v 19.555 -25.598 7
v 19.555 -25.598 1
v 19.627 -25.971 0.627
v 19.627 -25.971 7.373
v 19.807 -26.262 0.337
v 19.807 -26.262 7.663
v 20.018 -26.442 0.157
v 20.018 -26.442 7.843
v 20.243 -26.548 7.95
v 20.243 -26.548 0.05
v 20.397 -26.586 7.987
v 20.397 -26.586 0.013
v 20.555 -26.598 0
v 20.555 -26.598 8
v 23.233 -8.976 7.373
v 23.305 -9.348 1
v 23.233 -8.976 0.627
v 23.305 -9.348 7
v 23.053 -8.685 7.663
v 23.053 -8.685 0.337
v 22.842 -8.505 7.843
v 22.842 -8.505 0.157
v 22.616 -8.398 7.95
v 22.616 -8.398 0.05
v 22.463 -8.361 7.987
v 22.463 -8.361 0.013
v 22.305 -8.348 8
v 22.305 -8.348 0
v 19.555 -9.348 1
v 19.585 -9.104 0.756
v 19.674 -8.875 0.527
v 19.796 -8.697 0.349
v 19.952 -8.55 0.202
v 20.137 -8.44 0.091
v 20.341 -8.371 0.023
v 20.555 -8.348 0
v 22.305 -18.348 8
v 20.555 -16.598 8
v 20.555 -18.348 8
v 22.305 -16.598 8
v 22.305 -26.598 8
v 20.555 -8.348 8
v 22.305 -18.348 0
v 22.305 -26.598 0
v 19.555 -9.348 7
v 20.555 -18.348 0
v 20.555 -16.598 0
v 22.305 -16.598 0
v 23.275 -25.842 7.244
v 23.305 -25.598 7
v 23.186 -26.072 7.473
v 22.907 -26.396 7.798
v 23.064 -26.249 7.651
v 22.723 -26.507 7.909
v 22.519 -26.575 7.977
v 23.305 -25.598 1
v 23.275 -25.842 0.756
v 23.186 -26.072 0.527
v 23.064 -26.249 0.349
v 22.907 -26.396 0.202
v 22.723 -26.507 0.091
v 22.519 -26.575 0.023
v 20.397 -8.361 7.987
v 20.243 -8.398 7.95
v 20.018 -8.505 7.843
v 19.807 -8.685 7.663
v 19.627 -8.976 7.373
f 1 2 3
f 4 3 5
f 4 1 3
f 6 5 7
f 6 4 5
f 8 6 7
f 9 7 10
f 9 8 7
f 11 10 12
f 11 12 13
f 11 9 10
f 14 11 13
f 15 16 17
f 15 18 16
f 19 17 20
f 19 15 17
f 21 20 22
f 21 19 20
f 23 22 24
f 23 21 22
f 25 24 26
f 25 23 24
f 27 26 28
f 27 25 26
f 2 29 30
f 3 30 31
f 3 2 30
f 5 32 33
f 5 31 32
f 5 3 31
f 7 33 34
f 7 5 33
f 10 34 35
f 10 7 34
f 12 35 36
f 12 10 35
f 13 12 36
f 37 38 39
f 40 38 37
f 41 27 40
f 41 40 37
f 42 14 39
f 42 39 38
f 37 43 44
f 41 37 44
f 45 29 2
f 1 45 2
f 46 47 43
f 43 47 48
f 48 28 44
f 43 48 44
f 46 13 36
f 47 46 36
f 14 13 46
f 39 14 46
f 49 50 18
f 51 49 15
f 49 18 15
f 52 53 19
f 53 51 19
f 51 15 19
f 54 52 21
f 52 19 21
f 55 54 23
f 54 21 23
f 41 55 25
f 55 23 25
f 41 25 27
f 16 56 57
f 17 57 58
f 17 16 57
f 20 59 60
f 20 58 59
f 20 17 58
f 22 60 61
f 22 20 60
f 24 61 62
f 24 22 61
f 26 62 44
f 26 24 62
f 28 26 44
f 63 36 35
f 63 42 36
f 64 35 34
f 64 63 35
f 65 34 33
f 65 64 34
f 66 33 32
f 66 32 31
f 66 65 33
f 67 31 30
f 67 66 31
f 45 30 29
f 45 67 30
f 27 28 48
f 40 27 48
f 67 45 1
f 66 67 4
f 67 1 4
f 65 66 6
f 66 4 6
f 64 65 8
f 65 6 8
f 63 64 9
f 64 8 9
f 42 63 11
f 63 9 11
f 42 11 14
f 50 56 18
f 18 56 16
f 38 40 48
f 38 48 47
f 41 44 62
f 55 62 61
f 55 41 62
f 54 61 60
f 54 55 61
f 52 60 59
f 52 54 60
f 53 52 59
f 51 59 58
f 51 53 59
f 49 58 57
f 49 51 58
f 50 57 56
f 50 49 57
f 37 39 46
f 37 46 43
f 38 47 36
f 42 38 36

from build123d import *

# Parameters (mm, degrees)
F1_DEPTH = 8
F2_R     = 0.99999


# Not quite as in the source:
# - a fillet or chamfer is up to 0.001 mm smaller than in the source, because OpenCascade refuses the exact size


with BuildPart() as f1:
    # F0 (on Top) → F1 (new body)
    with BuildSketch(Plane.XY):
        Polygon((20.5548869669, -26.5982374549), (20.5548869669, -18.3482374549), (22.3048869669, -18.3482374549), (22.3048869669, -26.5982374549), (23.3048869669, -26.5982374549), (23.3048869669, -18.3482374549), (23.3048869669, -8.3482374549), (22.3048869669, -8.3482374549), (22.3048869669, -16.5982374549), (20.5548869669, -16.5982374549), (20.5548869669, -8.3482374549), (19.5548869669, -8.3482374549), (19.5548869669, -18.3482374549), (19.5548869669, -26.5982374549), align=None)
    extrude(amount=F1_DEPTH)

    # F2 (radius 1 in the source; OpenCascade refuses exactly that, so slightly less here)
    f2_edges = [f1.edges().sort_by_distance(p)[0] for p in [
        (23.304887, -26.598237, 4),
        (23.304887, -17.473237, 8),
        (23.304887, -8.348237, 4),
        (23.304887, -17.473237, 0),
        (19.554887, -26.598237, 4),
        (19.554887, -17.473237, 8),
        (19.554887, -8.348237, 4),
        (19.554887, -17.473237, 0),
    ]]
    fillet(f2_edges, radius=F2_R)


solid = f1.part
